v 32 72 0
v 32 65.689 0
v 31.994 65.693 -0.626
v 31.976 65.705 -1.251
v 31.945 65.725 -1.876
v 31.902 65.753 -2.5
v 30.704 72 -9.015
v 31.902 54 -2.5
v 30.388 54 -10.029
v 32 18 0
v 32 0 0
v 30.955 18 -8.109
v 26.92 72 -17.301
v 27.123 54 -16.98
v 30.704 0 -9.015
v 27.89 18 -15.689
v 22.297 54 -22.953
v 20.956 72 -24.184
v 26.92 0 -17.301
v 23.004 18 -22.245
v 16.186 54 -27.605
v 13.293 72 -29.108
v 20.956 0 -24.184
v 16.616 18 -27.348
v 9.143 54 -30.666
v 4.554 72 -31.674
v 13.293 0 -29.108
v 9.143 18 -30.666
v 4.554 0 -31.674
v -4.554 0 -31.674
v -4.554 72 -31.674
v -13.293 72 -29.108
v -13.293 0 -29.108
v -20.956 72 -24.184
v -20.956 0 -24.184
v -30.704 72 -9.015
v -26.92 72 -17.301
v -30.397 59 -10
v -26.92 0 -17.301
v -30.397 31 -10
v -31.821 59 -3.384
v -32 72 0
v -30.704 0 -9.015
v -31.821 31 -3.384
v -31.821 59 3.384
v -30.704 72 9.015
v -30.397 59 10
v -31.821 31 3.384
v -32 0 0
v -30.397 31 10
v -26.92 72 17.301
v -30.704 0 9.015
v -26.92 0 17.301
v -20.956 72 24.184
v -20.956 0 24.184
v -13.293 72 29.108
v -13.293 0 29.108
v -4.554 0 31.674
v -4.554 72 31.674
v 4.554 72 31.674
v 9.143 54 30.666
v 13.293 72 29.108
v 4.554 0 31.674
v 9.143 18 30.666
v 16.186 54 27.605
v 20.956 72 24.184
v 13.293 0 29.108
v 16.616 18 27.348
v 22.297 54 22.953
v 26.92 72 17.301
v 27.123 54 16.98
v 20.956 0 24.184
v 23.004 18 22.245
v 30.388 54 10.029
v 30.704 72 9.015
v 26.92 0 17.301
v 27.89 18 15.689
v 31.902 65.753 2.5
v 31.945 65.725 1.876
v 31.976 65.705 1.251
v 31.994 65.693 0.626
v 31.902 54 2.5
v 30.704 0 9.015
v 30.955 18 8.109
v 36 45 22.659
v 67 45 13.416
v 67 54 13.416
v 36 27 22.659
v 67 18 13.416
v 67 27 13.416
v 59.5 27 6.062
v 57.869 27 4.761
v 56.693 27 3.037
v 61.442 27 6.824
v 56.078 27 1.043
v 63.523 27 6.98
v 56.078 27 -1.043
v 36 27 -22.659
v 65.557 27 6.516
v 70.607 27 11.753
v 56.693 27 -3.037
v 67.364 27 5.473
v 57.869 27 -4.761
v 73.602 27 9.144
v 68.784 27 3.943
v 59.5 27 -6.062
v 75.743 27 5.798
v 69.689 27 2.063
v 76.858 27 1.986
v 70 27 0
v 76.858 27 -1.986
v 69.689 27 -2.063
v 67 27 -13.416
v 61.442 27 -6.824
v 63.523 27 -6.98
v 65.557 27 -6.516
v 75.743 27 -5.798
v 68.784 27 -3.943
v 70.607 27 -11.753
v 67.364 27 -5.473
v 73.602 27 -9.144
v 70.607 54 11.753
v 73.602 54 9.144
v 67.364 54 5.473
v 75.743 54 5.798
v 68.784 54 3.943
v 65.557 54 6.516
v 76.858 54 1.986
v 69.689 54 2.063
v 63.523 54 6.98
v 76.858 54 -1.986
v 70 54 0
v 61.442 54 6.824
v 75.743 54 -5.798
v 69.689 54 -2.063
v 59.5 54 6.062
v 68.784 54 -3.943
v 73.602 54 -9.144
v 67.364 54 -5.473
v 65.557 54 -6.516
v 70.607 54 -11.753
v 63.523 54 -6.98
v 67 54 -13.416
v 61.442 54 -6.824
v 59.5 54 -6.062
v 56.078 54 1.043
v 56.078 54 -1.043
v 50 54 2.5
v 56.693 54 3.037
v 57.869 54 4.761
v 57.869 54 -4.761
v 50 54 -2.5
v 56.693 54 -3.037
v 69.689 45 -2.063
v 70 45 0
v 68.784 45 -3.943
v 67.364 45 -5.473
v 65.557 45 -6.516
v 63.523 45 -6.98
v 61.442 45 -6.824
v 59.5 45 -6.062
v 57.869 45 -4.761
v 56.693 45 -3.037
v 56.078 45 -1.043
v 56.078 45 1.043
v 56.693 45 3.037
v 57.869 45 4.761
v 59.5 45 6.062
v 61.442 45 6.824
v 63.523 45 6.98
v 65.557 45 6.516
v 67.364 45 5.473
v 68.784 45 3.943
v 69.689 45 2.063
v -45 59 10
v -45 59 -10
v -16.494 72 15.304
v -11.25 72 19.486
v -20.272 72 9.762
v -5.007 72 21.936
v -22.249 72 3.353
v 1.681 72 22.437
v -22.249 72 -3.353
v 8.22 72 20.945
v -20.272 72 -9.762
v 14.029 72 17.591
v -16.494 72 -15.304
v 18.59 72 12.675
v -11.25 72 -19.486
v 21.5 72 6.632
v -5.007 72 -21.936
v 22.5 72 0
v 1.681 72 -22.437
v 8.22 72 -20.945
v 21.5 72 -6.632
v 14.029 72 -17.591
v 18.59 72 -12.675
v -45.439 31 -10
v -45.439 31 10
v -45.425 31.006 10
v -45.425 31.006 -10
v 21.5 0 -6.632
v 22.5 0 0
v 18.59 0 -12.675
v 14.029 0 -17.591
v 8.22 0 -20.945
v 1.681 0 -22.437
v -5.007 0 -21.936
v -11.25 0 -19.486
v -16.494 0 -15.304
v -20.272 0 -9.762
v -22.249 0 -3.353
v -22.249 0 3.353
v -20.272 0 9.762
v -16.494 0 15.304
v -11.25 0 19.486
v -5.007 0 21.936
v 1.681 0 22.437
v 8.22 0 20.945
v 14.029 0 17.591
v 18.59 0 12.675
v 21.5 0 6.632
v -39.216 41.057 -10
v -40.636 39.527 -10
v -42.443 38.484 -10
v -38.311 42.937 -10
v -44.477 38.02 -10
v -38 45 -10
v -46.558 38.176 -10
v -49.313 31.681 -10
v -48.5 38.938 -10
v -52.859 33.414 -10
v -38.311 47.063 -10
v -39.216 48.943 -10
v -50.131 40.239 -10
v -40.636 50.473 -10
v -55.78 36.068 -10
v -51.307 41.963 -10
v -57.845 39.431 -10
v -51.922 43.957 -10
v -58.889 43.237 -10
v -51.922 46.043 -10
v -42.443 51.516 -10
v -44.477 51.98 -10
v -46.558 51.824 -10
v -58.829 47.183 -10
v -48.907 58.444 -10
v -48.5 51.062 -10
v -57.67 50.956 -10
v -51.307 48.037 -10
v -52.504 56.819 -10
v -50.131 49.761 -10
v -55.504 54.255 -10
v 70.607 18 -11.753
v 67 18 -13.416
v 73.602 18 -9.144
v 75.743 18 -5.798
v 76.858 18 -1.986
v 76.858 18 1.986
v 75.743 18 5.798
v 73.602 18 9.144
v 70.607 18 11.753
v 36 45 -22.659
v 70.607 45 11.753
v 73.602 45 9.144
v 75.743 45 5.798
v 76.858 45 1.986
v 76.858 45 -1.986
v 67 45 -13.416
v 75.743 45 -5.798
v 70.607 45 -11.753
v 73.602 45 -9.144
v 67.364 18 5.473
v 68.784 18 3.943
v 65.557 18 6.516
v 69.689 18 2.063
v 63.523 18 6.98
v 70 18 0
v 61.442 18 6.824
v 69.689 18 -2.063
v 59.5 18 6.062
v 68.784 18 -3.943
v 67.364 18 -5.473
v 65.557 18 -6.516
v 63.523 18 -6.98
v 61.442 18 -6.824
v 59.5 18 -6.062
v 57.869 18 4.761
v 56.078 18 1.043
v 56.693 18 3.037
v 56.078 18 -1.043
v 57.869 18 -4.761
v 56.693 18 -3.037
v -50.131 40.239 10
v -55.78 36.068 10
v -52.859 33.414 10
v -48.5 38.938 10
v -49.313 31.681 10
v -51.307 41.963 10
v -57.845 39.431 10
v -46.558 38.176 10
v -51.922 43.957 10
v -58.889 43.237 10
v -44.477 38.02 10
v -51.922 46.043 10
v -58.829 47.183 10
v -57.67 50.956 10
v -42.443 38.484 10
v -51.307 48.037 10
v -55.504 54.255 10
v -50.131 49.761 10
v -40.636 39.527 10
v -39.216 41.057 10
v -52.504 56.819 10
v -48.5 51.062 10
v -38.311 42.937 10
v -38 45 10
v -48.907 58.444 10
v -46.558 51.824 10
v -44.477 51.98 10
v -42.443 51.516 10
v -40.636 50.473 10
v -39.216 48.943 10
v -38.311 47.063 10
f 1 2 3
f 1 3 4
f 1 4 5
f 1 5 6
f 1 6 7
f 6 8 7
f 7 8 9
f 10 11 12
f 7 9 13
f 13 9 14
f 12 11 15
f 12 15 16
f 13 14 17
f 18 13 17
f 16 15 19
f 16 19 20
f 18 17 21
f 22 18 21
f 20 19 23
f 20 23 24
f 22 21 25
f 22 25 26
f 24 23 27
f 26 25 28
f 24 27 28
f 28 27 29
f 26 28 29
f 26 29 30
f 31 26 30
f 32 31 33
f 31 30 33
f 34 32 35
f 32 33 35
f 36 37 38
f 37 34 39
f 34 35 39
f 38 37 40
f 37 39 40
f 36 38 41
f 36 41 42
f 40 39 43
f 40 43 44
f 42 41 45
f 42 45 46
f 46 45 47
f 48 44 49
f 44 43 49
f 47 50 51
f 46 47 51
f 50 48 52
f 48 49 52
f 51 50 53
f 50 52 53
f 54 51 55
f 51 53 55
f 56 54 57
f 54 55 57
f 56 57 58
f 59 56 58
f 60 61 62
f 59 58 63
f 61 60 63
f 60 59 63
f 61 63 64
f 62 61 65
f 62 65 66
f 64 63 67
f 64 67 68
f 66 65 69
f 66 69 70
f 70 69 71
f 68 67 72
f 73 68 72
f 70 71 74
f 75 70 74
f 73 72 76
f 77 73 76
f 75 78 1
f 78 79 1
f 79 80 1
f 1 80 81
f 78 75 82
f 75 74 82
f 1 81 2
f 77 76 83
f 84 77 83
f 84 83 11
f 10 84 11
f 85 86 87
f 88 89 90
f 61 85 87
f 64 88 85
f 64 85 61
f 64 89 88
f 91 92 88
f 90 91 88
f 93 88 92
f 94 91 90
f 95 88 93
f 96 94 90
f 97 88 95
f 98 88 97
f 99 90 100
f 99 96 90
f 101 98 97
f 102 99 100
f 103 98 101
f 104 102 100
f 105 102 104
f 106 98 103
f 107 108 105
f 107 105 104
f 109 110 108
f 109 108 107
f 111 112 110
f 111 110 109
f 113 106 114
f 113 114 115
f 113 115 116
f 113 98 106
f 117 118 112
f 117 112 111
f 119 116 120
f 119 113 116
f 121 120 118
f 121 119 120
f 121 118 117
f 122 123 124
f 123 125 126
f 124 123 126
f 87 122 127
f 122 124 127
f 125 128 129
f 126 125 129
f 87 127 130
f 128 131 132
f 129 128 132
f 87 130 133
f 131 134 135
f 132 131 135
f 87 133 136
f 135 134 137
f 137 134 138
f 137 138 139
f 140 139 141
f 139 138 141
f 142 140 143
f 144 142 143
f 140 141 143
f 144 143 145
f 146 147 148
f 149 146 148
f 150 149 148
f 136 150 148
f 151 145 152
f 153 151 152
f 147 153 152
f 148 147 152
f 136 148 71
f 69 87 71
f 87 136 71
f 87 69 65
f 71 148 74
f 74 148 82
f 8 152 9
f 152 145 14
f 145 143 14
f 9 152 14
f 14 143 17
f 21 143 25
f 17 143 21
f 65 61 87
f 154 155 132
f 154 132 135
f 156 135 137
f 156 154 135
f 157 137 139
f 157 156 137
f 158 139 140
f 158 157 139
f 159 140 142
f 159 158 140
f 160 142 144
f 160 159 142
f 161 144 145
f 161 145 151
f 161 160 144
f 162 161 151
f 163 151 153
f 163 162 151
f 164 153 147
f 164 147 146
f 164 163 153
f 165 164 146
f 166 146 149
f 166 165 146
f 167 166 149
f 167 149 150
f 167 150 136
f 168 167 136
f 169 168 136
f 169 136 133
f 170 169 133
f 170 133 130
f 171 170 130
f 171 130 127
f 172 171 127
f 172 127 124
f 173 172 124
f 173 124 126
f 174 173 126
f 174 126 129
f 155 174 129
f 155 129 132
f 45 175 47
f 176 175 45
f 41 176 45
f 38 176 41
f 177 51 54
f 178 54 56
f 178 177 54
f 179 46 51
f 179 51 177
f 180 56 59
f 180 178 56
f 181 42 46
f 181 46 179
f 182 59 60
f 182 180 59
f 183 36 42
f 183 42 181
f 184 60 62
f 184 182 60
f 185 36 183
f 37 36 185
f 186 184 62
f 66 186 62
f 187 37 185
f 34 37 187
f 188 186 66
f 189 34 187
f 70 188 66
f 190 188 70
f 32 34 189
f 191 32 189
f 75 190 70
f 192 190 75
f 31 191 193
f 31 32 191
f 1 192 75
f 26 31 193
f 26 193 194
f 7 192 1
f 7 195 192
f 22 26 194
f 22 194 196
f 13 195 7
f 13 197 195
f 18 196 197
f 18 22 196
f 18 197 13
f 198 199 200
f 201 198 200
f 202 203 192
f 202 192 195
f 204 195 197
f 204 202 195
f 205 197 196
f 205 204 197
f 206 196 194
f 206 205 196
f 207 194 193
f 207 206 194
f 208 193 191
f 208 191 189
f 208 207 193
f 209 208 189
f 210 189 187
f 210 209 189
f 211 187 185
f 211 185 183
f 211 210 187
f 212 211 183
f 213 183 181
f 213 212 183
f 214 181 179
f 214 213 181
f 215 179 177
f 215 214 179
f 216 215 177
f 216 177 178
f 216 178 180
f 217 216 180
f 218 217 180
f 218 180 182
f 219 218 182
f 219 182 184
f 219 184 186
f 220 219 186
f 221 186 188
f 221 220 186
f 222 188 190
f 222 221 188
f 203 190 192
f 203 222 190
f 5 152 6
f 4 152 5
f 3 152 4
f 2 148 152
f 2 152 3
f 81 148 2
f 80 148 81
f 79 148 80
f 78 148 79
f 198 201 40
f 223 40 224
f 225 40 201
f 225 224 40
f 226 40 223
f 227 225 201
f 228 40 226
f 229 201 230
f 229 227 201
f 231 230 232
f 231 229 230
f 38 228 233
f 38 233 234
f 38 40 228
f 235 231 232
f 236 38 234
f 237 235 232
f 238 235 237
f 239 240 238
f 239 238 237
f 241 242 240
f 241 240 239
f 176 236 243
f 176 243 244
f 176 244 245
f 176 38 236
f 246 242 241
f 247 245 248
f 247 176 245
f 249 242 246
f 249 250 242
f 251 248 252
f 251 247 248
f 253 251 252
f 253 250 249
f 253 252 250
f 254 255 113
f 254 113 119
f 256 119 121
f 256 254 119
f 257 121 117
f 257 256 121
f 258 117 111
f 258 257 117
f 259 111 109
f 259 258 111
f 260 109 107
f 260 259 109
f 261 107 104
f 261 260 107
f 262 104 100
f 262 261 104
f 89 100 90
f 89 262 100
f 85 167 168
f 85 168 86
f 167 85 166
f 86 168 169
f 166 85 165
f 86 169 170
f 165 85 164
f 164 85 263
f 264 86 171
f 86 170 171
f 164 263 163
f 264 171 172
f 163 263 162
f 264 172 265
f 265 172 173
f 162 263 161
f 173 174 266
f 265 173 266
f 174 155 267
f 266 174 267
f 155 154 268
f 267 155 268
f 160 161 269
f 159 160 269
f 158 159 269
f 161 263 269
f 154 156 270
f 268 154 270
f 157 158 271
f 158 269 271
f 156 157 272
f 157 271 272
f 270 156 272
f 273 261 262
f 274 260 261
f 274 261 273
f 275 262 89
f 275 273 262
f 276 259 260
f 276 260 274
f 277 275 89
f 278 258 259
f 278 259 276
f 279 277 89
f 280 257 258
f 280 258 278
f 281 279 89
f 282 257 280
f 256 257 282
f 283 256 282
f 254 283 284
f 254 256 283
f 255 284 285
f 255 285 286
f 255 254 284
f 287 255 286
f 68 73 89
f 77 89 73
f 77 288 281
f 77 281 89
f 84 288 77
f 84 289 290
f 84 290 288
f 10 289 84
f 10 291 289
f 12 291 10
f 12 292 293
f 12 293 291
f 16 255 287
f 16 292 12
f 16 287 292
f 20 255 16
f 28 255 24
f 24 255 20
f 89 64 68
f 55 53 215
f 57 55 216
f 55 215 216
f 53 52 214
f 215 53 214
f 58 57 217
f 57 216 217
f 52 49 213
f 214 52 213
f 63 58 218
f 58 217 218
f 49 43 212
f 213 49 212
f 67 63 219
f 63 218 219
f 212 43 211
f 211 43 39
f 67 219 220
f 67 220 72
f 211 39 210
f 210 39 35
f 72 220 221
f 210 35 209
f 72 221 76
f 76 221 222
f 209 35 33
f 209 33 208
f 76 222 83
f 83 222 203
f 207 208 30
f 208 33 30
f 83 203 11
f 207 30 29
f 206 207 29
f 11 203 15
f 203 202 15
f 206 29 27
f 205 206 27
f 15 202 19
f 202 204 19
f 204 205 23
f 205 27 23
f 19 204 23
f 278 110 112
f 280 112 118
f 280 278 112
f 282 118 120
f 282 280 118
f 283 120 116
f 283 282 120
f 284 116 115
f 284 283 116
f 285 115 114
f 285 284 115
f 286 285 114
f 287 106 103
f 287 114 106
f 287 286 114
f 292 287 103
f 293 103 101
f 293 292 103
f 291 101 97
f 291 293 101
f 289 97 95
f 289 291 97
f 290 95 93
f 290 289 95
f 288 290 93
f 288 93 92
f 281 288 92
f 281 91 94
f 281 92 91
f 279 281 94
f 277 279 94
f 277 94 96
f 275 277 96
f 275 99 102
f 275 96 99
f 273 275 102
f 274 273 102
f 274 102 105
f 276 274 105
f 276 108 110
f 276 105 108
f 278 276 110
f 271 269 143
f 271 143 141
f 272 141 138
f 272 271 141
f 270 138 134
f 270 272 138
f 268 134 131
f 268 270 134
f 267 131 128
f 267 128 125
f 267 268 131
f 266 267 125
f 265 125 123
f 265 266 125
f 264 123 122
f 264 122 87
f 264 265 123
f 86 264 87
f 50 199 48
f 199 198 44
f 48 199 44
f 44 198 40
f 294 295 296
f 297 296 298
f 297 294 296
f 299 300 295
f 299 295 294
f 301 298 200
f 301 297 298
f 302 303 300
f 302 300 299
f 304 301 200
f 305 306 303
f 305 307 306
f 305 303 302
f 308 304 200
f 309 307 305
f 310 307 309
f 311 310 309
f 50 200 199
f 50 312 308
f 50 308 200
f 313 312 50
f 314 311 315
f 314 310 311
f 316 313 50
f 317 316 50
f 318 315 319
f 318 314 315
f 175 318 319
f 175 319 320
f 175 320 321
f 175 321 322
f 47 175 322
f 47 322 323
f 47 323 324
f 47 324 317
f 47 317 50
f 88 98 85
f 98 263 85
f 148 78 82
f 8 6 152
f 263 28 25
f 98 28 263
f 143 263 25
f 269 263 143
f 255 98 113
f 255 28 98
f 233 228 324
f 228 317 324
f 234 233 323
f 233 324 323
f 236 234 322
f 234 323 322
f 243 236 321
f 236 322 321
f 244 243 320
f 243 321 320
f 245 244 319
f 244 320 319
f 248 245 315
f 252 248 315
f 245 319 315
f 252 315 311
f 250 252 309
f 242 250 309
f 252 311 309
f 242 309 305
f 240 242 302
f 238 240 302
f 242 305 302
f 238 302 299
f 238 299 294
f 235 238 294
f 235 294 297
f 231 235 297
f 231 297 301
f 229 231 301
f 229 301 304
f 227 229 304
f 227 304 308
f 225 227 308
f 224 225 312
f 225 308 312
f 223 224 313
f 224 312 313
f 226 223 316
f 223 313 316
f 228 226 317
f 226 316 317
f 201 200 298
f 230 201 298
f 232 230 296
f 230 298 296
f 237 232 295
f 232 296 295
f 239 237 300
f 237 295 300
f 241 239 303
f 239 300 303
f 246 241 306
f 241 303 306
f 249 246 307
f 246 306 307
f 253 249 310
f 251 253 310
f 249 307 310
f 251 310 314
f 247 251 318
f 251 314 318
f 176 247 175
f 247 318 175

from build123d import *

# Parameters (mm, degrees)
SKETCH_1_R               = 32
SKETCH_1_R_2             = 22.5
EXTRUDE_1_DEPTH          = 72
SKETCH_2_R               = 7
EXTRUDE_2_DEPTH          = 36
CUT_EXTRUDE_1_DEPTH      = 9
EXTRUDE_3_DEPTH          = 14
SKETCH_5_R               = 7
CUT_EXTRUDE_2_DEPTH      = 33
CUT_EXTRUDE_2_DEPTH_BACK = 33
CUT_EXTRUDE_3_DEPTH      = 23
CUT_EXTRUDE_3_DEPTH_BACK = 43
EXTRUDE_4_DEPTH          = 2.5


with BuildPart() as part:
    # 草图1 → 凸台-拉伸1 (new body)
    with BuildSketch(Plane(origin=(0, 0, 0), x_dir=(1, 0, 0), z_dir=(0, 1, 0))):
        Circle(SKETCH_1_R)
        Circle(SKETCH_1_R_2, mode=Mode.SUBTRACT)
    extrude(amount=EXTRUDE_1_DEPTH)

    # 草图2 → 凸台-拉伸2 (add)
    with BuildSketch(Plane(origin=(0, 18, 0), x_dir=(1, 0, 0), z_dir=(0, 1, 0))):
        with BuildLine():
            Line((9.142857143, 30.66607512), (67, 13.416407865))
            ThreePointArc((67, 13.416407865), (77, 0), (67, -13.416407865))
            Line((67, -13.416407865), (9.142857143, -30.66607512))
            ThreePointArc((9.142857143, -30.66607512), (32, 0), (9.142857143, 30.66607512))
        make_face()
        with Locations((63, 0)):
            Circle(SKETCH_2_R, mode=Mode.SUBTRACT)
    extrude(amount=EXTRUDE_2_DEPTH)

    # 草图3 → 切除-拉伸1 (cut, symmetric)
    with BuildSketch(Plane(origin=(0, 36, 0), x_dir=(1, 0, 0), z_dir=(0, 1, 0))):
        with BuildLine():
            Line((36, 22.658822172), (36, -22.658822172))
            Line((36, -22.658822172), (67, -13.416407865))
            ThreePointArc((67, -13.416407865), (77, 0), (67, 13.416407865))
            Line((67, 13.416407865), (36, 22.658822172))
        make_face()
    extrude(amount=CUT_EXTRUDE_1_DEPTH, both=True, mode=Mode.SUBTRACT)

    # 草图4 → 凸台-拉伸3 (add, symmetric)
    with BuildSketch(Plane(origin=(0, 45, 0), x_dir=(1, 0, 0), z_dir=(0, 1, 0))):
        with BuildLine():
            Line((-30.330505487, 10), (-45, 10))
            Line((-45, 10), (-59, 10))
            Line((-59, 10), (-59, -10))
            Line((-59, -10), (-45, -10))
            Line((-45, -10), (-30.330505487, -10))
            ThreePointArc((-30.330505487, -10), (-31.936492655, 0), (-30.330505487, 10))
        make_face()
    extrude(amount=EXTRUDE_3_DEPTH, both=True)

    # 草图5 → 切除-拉伸2 (cut, two sides)
    with BuildSketch(Plane.XY) as cut_extrude_2_sk:
        with Locations((-45, 45)):
            Circle(SKETCH_5_R)
    extrude(amount=CUT_EXTRUDE_2_DEPTH, mode=Mode.SUBTRACT)
    extrude(cut_extrude_2_sk.sketch, amount=-CUT_EXTRUDE_2_DEPTH_BACK, mode=Mode.SUBTRACT)

    # 草图6 → 切除-拉伸3 (cut, two sides)
    with BuildSketch(Plane.XY.offset(10)) as cut_extrude_3_sk:
        with BuildLine():
            Line((-45, 59), (-45, 73.390549991))
            Line((-45, 73.390549991), (-74.161740497, 70.167226716))
            Line((-74.161740497, 70.167226716), (-67.715093947, 21.172712935))
            Line((-67.715093947, 21.172712935), (-45.42483437, 31.00644735))
            ThreePointArc((-45.42483437, 31.00644735), (-58.99838807, 45.212441645), (-45, 59))
        make_face()
    extrude(amount=CUT_EXTRUDE_3_DEPTH, mode=Mode.SUBTRACT)
    extrude(cut_extrude_3_sk.sketch, amount=-CUT_EXTRUDE_3_DEPTH_BACK, mode=Mode.SUBTRACT)

    # 草图7 → 凸台-拉伸4 (add, symmetric)
    with BuildSketch(Plane.XY):
        Polygon((50, 54), (28.987302247, 67.645805474), (28.987302247, 54), align=None)
    extrude(amount=EXTRUDE_4_DEPTH, both=True)


solid = part.part
